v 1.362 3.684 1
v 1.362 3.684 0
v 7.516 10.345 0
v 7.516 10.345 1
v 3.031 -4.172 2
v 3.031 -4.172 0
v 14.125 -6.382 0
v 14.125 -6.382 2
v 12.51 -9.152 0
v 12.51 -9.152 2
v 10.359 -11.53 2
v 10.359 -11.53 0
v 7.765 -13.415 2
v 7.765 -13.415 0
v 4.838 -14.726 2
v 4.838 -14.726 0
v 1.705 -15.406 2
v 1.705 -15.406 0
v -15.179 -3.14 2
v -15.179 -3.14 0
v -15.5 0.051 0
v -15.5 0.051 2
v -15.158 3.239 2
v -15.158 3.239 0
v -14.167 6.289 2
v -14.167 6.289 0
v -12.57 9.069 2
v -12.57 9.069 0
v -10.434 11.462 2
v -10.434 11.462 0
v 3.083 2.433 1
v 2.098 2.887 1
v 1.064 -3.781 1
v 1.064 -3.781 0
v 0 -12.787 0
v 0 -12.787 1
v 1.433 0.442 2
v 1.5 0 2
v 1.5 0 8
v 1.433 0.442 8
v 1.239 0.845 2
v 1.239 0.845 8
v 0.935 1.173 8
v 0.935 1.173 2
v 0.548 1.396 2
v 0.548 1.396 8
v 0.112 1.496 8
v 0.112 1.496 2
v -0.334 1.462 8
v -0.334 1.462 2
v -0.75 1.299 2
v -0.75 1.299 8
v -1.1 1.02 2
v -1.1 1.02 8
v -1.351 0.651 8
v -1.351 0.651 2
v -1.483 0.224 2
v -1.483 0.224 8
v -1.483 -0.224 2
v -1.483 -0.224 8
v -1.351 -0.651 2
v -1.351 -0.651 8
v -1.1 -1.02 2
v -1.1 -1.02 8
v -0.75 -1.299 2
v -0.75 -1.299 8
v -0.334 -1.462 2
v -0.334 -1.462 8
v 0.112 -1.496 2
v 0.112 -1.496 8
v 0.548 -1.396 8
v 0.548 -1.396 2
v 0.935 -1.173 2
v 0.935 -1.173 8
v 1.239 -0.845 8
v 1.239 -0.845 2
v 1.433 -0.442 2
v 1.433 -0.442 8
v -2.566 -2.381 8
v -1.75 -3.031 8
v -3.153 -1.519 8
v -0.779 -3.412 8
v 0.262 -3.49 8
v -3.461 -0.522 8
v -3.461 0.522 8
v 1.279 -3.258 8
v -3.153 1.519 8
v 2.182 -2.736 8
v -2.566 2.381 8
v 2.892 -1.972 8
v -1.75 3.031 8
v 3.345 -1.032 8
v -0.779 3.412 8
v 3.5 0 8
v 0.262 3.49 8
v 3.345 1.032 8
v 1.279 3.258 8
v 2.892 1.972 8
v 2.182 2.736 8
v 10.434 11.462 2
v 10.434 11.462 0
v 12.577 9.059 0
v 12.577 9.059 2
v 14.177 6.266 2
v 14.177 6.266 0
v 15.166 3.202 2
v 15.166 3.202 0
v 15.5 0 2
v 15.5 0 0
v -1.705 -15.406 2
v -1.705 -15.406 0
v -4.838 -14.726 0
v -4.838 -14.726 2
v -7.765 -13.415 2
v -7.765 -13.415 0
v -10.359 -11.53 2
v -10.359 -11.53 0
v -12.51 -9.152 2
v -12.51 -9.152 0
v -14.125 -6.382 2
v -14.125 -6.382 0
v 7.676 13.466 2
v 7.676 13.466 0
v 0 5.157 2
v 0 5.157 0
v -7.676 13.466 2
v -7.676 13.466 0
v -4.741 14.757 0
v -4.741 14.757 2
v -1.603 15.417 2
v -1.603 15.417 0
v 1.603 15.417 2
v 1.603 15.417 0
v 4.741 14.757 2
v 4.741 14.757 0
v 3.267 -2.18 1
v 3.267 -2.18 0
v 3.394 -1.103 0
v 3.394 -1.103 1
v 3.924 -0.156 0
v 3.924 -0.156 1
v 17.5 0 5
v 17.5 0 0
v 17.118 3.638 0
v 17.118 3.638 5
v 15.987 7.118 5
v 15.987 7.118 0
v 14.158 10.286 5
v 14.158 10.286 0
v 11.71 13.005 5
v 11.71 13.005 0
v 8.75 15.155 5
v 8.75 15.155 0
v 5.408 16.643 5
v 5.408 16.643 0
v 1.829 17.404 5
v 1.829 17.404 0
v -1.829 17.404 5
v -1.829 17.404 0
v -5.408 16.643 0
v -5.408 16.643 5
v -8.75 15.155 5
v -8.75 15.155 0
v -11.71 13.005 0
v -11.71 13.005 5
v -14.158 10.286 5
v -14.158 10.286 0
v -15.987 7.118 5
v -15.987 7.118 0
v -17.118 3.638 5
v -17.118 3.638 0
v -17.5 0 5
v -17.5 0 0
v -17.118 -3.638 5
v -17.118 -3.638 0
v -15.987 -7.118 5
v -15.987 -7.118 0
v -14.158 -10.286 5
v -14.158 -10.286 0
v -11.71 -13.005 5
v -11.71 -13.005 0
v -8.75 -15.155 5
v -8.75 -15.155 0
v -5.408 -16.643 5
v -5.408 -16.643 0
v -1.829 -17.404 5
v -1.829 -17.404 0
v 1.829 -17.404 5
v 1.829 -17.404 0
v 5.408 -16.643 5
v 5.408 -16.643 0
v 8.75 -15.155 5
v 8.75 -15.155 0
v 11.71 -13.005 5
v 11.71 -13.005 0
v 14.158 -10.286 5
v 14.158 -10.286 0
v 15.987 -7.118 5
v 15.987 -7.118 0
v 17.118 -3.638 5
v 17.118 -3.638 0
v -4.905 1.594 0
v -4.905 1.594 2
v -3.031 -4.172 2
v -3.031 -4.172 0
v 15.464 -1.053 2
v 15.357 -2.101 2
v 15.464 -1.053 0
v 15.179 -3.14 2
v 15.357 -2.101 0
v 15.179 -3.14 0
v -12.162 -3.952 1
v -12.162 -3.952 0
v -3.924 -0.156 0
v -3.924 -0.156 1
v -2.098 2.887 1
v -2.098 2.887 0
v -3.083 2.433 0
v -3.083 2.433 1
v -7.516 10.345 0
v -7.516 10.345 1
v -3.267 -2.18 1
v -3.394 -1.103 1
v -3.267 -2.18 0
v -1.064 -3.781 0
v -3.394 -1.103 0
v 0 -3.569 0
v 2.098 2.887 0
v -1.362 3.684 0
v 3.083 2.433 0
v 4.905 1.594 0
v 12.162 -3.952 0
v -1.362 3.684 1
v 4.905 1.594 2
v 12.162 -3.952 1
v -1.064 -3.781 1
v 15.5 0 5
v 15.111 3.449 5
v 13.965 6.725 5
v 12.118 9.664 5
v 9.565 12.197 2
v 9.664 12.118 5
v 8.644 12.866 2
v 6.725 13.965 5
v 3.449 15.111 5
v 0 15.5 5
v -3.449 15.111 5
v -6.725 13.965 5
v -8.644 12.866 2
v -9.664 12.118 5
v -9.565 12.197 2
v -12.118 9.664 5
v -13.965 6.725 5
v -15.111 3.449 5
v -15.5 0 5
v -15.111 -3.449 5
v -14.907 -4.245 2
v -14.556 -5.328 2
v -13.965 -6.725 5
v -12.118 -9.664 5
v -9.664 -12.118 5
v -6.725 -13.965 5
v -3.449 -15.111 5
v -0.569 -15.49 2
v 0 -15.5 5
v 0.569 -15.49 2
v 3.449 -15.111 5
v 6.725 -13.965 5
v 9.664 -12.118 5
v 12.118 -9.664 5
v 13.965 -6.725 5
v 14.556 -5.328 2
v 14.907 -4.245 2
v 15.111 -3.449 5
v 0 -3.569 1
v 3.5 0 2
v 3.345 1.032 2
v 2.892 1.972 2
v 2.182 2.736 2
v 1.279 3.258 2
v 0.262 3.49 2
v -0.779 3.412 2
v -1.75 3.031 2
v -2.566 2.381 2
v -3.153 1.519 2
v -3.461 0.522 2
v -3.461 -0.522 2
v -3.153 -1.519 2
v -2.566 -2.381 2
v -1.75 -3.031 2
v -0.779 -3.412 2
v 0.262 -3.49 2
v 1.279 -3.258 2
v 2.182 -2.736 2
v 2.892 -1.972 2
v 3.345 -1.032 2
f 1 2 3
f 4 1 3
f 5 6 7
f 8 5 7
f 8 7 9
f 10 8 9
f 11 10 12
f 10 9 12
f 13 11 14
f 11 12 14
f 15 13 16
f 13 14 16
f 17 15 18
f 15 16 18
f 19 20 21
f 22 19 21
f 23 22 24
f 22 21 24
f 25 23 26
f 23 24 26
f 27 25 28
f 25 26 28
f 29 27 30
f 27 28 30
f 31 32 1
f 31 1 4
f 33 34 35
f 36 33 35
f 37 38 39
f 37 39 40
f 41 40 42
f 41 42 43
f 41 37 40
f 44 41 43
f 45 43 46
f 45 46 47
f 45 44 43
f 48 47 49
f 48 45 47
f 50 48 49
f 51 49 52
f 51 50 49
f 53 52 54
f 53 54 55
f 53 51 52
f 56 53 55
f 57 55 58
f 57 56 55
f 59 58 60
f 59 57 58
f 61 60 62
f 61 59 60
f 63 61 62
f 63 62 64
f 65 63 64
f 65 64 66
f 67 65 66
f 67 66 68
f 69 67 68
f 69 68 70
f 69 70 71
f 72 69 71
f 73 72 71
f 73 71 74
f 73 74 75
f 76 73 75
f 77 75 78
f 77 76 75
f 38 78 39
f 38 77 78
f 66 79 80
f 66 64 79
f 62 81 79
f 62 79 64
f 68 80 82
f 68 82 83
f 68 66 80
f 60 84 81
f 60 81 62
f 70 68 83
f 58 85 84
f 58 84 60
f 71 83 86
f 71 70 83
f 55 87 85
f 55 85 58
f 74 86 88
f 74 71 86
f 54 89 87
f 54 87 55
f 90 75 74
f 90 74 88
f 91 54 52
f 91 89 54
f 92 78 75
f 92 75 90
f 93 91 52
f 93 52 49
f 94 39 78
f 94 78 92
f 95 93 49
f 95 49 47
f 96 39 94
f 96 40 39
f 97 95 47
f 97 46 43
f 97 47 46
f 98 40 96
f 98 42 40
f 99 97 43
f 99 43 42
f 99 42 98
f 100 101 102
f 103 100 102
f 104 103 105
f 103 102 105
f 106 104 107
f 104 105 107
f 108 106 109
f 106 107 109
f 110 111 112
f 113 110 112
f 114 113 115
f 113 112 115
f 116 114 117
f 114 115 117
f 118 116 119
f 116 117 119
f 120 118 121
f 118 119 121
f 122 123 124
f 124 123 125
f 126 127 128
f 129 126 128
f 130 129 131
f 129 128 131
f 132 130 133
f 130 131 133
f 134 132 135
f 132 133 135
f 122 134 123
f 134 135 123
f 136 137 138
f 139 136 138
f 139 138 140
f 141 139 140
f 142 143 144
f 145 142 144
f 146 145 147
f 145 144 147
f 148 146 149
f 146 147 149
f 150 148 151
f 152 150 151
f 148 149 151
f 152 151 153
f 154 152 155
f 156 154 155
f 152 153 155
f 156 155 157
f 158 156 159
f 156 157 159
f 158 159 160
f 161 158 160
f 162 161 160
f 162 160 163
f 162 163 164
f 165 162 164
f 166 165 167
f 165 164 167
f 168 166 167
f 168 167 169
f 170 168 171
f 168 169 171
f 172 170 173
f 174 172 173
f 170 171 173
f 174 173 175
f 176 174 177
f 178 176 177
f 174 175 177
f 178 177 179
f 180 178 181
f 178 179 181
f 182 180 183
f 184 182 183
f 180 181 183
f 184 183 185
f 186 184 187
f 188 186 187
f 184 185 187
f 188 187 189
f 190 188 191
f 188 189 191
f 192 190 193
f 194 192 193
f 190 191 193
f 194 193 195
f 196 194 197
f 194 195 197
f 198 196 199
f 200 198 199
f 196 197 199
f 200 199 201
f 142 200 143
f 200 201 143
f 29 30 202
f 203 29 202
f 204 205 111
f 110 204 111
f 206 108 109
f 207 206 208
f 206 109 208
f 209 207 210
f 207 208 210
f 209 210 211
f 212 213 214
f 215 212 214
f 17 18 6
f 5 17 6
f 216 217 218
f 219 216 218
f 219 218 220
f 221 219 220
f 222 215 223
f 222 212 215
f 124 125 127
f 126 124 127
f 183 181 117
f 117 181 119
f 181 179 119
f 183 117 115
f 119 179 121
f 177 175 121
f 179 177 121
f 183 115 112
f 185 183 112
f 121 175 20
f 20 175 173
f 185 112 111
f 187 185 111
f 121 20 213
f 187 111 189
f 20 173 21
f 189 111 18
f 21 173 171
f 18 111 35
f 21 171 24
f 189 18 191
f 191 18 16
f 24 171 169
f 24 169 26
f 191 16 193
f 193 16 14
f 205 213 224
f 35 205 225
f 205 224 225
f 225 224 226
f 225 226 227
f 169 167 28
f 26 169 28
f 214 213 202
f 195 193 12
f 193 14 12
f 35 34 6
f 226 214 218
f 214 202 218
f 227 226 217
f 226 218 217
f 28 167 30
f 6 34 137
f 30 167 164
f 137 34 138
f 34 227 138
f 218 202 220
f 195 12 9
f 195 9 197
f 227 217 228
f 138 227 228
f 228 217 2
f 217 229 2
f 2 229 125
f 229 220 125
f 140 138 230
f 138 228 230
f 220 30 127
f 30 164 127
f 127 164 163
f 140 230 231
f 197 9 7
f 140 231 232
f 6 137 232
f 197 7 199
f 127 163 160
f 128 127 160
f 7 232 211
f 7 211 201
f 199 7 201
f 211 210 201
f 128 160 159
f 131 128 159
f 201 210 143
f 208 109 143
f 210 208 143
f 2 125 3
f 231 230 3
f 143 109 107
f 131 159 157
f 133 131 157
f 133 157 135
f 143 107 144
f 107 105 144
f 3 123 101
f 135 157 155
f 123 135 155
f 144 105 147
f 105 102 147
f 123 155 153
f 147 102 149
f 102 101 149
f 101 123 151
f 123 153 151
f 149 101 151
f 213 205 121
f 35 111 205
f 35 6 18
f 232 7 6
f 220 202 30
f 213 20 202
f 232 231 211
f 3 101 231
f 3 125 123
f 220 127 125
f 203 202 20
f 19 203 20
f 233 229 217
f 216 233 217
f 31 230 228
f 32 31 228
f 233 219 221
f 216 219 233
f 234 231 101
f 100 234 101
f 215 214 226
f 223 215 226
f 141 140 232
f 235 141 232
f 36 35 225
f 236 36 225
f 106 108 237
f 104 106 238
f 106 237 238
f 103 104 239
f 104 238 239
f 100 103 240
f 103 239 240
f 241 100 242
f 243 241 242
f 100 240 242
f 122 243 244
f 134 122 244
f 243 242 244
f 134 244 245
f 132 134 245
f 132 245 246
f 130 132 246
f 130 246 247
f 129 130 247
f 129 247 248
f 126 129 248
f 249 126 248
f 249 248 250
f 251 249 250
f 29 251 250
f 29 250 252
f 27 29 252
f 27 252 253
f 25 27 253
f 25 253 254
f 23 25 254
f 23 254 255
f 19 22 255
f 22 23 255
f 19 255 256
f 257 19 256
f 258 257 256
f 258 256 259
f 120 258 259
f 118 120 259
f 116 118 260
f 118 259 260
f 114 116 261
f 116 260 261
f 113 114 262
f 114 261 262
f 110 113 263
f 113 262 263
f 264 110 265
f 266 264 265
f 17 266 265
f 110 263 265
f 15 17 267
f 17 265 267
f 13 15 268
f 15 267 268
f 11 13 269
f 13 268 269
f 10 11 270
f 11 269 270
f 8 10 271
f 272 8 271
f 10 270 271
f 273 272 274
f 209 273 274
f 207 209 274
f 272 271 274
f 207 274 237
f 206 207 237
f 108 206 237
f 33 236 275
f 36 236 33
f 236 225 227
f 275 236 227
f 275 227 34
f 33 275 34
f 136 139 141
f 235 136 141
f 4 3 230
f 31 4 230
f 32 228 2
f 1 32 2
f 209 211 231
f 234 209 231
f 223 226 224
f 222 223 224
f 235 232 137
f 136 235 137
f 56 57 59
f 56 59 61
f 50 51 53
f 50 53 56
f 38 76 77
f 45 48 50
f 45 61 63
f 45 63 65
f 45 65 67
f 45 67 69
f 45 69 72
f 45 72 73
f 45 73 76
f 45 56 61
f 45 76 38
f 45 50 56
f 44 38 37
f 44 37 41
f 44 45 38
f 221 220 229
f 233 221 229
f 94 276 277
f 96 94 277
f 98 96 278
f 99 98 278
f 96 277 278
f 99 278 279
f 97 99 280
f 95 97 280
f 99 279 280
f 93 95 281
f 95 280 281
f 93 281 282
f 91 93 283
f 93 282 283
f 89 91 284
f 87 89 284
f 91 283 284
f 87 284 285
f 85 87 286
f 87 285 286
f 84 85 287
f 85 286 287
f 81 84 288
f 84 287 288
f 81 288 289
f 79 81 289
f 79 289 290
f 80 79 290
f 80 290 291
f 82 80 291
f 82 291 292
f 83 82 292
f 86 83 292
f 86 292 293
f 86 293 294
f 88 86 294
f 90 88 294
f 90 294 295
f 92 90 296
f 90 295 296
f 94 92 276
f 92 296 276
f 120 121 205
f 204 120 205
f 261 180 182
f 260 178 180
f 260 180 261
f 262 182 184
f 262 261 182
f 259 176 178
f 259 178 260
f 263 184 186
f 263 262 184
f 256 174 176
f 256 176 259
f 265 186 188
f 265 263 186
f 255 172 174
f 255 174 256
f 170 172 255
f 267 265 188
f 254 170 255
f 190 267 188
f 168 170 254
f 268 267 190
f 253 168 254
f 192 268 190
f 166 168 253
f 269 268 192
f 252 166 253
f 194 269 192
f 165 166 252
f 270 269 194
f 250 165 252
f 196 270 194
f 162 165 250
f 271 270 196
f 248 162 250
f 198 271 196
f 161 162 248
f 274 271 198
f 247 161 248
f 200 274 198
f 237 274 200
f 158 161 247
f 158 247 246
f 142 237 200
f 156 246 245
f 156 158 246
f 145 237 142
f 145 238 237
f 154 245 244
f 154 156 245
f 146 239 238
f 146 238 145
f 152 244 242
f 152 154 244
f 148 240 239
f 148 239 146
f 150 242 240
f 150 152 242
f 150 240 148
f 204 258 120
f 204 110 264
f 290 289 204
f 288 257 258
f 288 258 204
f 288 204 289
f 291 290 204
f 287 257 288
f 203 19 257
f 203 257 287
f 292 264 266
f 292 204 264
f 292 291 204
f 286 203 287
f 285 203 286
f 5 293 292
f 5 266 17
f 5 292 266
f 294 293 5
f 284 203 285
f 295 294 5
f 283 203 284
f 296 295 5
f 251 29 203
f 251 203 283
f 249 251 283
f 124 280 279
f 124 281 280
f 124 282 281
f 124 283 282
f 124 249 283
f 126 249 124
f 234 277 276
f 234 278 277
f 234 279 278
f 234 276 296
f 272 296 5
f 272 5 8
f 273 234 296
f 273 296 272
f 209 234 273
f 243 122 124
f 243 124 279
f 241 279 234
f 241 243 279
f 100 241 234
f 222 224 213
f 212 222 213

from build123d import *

# Parameters (mm, degrees)
F0_R     = 17.5
F1_DEPTH = 5
F2_R     = 15.5
F3_DEPTH = 3
F4_R     = 3.5
F4_R_2   = 1.5
F5_DEPTH = 6
F7_DEPTH = 1
F8_DEPTH = 2


with BuildPart() as f1:
    # F0 (on Top) → F1 (new body)
    with BuildSketch(Plane.XY):
        Circle(F0_R)
    extrude(amount=F1_DEPTH)

    # F2 (on face) → F3 (cut)
    with BuildSketch(Plane.XY.offset(5)):
        Circle(F2_R)
    extrude(amount=-F3_DEPTH, mode=Mode.SUBTRACT)

    # F4 (on face) → F5 (join)
    with BuildSketch(Plane.XY.offset(2)):
        Circle(F4_R)
        Circle(F4_R_2, mode=Mode.SUBTRACT)
    extrude(amount=F5_DEPTH)

    # F6 (on face) → F7 (cut)
    with BuildSketch(Plane(origin=(0, 0, 0), x_dir=(1, 0, 0), z_dir=(0, 0, -1))):
        Polygon((-3.9243327608, 0.1564746204), (-3.3940706843, 1.1028004157), (-3.2668253693, 2.1800742948), (-12.161596097, 3.9515421095), align=None)
        Polygon((1.0638693073, 3.7806155611), (0, 12.7874588824), (-1.0638693073, 3.7806155611), (0, 3.5687371109), align=None)
        Polygon((3.2668253693, 2.1800742948), (3.3940706843, 1.1028004157), (3.9243327608, 0.1564746204), (12.161596097, 3.9515421095), align=None)
        Polygon((3.0828784209, -2.4332555489), (2.0976510431, -2.8871689712), (1.361501722, -3.6839089274), (7.5162797454, -10.3452715508), align=None)
        Polygon((-1.361501722, -3.6839089274), (-2.0976510431, -2.8871689712), (-3.0828784209, -2.4332555489), (-7.5162797454, -10.3452715508), align=None)
    extrude(amount=-F7_DEPTH, mode=Mode.SUBTRACT)

    # F6 (on face) → F8 (cut)
    with BuildSketch(Plane(origin=(0, 0, 0), x_dir=(1, 0, 0), z_dir=(0, 0, -1))):
        with BuildLine():
            Line((7.6763518896, -13.4656459803), (0, -5.1574724983))
            Line((0, -5.1574724983), (-7.6763518896, -13.4656459803))
            ThreePointArc((-7.6763518896, -13.4656459803), (0, -15.5), (7.6763518896, -13.4656459803))
        make_face()
        with BuildLine():
            Line((-10.434467167, -11.4617579341), (-4.9050478272, -1.59374665))
            Line((-4.9050478272, -1.59374665), (-15.1787135444, 3.1395310378))
            ThreePointArc((-15.1787135444, 3.1395310378), (-14.7413760026, -4.7897634128), (-10.434467167, -11.4617579341))
        make_face()
        with BuildLine():
            Line((1.7046089863, 15.4059828704), (3.0314862736, 4.1724828992))
            Line((3.0314862736, 4.1724828992), (14.1252072533, 6.3818900062))
            ThreePointArc((14.1252072533, 6.3818900062), (9.1106714105, 12.5397634128), (1.7046089863, 15.4059828704))
        make_face()
        with BuildLine():
            Line((15.1787135444, 3.1395310378), (4.9050478272, -1.59374665))
            Line((4.9050478272, -1.59374665), (10.434467167, -11.4617579341))
            ThreePointArc((10.434467167, -11.4617579341), (14.1771689891, -6.2656108605), (15.5, 0))
            ThreePointArc((15.5, 0), (15.4194691857, 1.5779638877), (15.1787135444, 3.1395310378))
        make_face()
        with BuildLine():
            Line((-14.1252072533, 6.3818900062), (-3.0314862736, 4.1724828992))
            Line((-3.0314862736, 4.1724828992), (-1.7046089863, 15.4059828704))
            ThreePointArc((-1.7046089863, 15.4059828704), (-9.1106714105, 12.5397634128), (-14.1252072533, 6.3818900062))
        make_face()
    extrude(amount=-F8_DEPTH, mode=Mode.SUBTRACT)


solid = f1.part
